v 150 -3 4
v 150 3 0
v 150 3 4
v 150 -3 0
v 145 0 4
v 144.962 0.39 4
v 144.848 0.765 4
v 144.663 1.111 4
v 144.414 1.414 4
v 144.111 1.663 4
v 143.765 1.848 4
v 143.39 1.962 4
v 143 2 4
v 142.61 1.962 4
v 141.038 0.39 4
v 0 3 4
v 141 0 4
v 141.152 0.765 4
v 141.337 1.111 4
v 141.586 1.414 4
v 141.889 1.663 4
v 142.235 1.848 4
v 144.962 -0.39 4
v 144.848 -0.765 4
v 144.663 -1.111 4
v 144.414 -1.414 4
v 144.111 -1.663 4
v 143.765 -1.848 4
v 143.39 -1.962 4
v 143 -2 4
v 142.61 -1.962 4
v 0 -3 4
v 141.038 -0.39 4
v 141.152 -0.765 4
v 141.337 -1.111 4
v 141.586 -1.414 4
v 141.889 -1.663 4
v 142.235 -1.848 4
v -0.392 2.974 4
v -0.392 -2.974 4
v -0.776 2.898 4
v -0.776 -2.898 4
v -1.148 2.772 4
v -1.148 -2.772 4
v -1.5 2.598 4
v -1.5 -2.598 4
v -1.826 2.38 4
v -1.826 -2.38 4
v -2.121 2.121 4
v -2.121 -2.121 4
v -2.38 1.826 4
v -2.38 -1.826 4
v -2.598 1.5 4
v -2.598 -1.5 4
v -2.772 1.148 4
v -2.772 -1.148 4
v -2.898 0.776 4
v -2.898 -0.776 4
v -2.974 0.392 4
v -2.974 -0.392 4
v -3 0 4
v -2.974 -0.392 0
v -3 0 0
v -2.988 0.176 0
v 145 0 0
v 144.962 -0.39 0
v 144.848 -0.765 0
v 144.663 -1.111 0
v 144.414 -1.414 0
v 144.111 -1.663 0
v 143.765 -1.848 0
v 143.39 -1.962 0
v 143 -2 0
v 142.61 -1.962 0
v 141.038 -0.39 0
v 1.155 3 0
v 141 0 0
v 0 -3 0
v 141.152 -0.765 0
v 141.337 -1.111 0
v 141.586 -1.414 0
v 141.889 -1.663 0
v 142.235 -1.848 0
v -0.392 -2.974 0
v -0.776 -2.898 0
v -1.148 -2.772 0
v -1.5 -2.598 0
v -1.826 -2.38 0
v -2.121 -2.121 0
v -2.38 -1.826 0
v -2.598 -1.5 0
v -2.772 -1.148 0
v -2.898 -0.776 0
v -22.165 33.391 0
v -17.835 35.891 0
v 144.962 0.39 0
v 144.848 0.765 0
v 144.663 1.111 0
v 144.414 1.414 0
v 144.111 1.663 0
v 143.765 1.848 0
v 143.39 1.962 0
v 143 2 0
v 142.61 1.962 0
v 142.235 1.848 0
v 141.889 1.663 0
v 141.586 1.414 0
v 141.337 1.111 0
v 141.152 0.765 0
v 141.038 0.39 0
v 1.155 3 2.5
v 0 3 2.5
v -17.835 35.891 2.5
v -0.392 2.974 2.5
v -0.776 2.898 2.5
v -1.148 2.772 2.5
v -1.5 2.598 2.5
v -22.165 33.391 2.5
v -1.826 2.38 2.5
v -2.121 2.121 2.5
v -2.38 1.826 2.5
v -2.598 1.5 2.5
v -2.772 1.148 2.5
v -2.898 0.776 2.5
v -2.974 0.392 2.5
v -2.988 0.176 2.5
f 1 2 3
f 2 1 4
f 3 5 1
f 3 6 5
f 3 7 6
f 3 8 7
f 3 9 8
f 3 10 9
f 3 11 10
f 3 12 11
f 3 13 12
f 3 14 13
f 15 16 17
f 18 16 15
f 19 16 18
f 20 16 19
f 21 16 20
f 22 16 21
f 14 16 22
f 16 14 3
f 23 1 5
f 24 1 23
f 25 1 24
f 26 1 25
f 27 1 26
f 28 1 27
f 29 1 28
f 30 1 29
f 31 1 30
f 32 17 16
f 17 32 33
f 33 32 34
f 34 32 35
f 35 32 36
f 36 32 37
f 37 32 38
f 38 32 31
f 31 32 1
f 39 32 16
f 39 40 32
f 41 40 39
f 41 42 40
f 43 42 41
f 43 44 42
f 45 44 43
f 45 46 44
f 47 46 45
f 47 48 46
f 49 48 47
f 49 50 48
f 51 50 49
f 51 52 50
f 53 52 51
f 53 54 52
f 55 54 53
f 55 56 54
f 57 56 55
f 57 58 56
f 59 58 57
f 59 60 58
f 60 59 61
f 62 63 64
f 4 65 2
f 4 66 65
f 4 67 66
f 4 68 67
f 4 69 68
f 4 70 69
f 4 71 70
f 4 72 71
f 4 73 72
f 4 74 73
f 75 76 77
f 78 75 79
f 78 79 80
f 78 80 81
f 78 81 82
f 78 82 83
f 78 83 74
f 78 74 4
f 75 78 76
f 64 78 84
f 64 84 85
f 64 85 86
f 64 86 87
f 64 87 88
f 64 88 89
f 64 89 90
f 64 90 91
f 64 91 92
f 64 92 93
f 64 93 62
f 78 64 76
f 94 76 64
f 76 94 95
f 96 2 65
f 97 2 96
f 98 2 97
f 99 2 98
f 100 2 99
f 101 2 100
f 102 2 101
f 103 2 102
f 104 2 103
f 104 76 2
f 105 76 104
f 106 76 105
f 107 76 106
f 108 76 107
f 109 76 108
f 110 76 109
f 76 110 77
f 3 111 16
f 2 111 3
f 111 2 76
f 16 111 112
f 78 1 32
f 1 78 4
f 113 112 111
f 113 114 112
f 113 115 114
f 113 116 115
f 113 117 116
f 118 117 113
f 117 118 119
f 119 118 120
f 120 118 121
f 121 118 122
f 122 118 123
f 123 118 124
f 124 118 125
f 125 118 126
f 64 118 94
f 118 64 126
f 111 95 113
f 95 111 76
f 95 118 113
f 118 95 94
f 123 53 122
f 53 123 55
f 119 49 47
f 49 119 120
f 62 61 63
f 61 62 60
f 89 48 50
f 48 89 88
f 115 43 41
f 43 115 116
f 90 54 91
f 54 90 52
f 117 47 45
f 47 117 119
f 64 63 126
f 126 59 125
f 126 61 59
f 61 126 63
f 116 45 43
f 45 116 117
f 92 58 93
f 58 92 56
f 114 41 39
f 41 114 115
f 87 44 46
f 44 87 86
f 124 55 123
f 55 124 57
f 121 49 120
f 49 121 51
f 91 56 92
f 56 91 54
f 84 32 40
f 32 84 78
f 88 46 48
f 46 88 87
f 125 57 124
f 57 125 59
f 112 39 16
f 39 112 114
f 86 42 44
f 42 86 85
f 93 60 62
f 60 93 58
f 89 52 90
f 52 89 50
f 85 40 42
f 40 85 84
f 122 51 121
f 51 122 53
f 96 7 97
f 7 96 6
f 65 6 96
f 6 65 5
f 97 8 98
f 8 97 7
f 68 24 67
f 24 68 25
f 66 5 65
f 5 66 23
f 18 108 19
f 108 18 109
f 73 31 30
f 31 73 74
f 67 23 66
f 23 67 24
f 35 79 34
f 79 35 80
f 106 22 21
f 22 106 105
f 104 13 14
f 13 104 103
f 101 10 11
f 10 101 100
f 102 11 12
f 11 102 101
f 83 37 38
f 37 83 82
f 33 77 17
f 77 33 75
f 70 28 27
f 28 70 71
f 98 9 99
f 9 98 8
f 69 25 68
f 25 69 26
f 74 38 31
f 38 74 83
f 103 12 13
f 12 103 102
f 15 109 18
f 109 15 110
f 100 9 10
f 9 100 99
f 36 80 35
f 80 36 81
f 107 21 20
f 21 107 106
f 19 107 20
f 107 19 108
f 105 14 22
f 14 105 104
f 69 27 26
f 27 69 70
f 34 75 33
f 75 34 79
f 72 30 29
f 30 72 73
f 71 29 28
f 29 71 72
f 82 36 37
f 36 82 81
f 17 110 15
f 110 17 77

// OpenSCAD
// L-shaped ("hockey-stick") cell spreader for plating bacteria
// Category: tools. A flat handle and a thinner spreading foot at 120 degrees, joined by a round
// boss; the foot's bed side is the smooth spreading face. Hanging hole at the handle end.
// Print: PETG or PP, lying flat, 0.15 mm layers, 100 % infill; sterilise with 70 % ethanol
// (or autoclave only if printed in PP).
// SPDX-License-Identifier: CERN-OHL-P-2.0

/* [Spreader] */
handle = [150, 6, 4];     // length (X), width (Y), thickness (Z)
foot = [40, 5, 2.5];      // length along its centre line, width, thickness
foot_angle = 120;         // counter-clockwise from +X, seen from above
boss_d = 6;               // joins the bars at the origin, full handle thickness
hole_d = 4;
hole_x = 143;

/* [Hidden] */
eps = 0.01;

difference() {
    union() {
        translate([0, -handle.y / 2, 0]) cube(handle);
        rotate([0, 0, foot_angle]) translate([0, -foot.y / 2, 0]) cube(foot);
        cylinder(d = boss_d, h = handle.z, $fn = 48);
    }
    translate([hole_x, 0, -1]) cylinder(d = hole_d, h = handle.z + 2, $fn = 32);
}
